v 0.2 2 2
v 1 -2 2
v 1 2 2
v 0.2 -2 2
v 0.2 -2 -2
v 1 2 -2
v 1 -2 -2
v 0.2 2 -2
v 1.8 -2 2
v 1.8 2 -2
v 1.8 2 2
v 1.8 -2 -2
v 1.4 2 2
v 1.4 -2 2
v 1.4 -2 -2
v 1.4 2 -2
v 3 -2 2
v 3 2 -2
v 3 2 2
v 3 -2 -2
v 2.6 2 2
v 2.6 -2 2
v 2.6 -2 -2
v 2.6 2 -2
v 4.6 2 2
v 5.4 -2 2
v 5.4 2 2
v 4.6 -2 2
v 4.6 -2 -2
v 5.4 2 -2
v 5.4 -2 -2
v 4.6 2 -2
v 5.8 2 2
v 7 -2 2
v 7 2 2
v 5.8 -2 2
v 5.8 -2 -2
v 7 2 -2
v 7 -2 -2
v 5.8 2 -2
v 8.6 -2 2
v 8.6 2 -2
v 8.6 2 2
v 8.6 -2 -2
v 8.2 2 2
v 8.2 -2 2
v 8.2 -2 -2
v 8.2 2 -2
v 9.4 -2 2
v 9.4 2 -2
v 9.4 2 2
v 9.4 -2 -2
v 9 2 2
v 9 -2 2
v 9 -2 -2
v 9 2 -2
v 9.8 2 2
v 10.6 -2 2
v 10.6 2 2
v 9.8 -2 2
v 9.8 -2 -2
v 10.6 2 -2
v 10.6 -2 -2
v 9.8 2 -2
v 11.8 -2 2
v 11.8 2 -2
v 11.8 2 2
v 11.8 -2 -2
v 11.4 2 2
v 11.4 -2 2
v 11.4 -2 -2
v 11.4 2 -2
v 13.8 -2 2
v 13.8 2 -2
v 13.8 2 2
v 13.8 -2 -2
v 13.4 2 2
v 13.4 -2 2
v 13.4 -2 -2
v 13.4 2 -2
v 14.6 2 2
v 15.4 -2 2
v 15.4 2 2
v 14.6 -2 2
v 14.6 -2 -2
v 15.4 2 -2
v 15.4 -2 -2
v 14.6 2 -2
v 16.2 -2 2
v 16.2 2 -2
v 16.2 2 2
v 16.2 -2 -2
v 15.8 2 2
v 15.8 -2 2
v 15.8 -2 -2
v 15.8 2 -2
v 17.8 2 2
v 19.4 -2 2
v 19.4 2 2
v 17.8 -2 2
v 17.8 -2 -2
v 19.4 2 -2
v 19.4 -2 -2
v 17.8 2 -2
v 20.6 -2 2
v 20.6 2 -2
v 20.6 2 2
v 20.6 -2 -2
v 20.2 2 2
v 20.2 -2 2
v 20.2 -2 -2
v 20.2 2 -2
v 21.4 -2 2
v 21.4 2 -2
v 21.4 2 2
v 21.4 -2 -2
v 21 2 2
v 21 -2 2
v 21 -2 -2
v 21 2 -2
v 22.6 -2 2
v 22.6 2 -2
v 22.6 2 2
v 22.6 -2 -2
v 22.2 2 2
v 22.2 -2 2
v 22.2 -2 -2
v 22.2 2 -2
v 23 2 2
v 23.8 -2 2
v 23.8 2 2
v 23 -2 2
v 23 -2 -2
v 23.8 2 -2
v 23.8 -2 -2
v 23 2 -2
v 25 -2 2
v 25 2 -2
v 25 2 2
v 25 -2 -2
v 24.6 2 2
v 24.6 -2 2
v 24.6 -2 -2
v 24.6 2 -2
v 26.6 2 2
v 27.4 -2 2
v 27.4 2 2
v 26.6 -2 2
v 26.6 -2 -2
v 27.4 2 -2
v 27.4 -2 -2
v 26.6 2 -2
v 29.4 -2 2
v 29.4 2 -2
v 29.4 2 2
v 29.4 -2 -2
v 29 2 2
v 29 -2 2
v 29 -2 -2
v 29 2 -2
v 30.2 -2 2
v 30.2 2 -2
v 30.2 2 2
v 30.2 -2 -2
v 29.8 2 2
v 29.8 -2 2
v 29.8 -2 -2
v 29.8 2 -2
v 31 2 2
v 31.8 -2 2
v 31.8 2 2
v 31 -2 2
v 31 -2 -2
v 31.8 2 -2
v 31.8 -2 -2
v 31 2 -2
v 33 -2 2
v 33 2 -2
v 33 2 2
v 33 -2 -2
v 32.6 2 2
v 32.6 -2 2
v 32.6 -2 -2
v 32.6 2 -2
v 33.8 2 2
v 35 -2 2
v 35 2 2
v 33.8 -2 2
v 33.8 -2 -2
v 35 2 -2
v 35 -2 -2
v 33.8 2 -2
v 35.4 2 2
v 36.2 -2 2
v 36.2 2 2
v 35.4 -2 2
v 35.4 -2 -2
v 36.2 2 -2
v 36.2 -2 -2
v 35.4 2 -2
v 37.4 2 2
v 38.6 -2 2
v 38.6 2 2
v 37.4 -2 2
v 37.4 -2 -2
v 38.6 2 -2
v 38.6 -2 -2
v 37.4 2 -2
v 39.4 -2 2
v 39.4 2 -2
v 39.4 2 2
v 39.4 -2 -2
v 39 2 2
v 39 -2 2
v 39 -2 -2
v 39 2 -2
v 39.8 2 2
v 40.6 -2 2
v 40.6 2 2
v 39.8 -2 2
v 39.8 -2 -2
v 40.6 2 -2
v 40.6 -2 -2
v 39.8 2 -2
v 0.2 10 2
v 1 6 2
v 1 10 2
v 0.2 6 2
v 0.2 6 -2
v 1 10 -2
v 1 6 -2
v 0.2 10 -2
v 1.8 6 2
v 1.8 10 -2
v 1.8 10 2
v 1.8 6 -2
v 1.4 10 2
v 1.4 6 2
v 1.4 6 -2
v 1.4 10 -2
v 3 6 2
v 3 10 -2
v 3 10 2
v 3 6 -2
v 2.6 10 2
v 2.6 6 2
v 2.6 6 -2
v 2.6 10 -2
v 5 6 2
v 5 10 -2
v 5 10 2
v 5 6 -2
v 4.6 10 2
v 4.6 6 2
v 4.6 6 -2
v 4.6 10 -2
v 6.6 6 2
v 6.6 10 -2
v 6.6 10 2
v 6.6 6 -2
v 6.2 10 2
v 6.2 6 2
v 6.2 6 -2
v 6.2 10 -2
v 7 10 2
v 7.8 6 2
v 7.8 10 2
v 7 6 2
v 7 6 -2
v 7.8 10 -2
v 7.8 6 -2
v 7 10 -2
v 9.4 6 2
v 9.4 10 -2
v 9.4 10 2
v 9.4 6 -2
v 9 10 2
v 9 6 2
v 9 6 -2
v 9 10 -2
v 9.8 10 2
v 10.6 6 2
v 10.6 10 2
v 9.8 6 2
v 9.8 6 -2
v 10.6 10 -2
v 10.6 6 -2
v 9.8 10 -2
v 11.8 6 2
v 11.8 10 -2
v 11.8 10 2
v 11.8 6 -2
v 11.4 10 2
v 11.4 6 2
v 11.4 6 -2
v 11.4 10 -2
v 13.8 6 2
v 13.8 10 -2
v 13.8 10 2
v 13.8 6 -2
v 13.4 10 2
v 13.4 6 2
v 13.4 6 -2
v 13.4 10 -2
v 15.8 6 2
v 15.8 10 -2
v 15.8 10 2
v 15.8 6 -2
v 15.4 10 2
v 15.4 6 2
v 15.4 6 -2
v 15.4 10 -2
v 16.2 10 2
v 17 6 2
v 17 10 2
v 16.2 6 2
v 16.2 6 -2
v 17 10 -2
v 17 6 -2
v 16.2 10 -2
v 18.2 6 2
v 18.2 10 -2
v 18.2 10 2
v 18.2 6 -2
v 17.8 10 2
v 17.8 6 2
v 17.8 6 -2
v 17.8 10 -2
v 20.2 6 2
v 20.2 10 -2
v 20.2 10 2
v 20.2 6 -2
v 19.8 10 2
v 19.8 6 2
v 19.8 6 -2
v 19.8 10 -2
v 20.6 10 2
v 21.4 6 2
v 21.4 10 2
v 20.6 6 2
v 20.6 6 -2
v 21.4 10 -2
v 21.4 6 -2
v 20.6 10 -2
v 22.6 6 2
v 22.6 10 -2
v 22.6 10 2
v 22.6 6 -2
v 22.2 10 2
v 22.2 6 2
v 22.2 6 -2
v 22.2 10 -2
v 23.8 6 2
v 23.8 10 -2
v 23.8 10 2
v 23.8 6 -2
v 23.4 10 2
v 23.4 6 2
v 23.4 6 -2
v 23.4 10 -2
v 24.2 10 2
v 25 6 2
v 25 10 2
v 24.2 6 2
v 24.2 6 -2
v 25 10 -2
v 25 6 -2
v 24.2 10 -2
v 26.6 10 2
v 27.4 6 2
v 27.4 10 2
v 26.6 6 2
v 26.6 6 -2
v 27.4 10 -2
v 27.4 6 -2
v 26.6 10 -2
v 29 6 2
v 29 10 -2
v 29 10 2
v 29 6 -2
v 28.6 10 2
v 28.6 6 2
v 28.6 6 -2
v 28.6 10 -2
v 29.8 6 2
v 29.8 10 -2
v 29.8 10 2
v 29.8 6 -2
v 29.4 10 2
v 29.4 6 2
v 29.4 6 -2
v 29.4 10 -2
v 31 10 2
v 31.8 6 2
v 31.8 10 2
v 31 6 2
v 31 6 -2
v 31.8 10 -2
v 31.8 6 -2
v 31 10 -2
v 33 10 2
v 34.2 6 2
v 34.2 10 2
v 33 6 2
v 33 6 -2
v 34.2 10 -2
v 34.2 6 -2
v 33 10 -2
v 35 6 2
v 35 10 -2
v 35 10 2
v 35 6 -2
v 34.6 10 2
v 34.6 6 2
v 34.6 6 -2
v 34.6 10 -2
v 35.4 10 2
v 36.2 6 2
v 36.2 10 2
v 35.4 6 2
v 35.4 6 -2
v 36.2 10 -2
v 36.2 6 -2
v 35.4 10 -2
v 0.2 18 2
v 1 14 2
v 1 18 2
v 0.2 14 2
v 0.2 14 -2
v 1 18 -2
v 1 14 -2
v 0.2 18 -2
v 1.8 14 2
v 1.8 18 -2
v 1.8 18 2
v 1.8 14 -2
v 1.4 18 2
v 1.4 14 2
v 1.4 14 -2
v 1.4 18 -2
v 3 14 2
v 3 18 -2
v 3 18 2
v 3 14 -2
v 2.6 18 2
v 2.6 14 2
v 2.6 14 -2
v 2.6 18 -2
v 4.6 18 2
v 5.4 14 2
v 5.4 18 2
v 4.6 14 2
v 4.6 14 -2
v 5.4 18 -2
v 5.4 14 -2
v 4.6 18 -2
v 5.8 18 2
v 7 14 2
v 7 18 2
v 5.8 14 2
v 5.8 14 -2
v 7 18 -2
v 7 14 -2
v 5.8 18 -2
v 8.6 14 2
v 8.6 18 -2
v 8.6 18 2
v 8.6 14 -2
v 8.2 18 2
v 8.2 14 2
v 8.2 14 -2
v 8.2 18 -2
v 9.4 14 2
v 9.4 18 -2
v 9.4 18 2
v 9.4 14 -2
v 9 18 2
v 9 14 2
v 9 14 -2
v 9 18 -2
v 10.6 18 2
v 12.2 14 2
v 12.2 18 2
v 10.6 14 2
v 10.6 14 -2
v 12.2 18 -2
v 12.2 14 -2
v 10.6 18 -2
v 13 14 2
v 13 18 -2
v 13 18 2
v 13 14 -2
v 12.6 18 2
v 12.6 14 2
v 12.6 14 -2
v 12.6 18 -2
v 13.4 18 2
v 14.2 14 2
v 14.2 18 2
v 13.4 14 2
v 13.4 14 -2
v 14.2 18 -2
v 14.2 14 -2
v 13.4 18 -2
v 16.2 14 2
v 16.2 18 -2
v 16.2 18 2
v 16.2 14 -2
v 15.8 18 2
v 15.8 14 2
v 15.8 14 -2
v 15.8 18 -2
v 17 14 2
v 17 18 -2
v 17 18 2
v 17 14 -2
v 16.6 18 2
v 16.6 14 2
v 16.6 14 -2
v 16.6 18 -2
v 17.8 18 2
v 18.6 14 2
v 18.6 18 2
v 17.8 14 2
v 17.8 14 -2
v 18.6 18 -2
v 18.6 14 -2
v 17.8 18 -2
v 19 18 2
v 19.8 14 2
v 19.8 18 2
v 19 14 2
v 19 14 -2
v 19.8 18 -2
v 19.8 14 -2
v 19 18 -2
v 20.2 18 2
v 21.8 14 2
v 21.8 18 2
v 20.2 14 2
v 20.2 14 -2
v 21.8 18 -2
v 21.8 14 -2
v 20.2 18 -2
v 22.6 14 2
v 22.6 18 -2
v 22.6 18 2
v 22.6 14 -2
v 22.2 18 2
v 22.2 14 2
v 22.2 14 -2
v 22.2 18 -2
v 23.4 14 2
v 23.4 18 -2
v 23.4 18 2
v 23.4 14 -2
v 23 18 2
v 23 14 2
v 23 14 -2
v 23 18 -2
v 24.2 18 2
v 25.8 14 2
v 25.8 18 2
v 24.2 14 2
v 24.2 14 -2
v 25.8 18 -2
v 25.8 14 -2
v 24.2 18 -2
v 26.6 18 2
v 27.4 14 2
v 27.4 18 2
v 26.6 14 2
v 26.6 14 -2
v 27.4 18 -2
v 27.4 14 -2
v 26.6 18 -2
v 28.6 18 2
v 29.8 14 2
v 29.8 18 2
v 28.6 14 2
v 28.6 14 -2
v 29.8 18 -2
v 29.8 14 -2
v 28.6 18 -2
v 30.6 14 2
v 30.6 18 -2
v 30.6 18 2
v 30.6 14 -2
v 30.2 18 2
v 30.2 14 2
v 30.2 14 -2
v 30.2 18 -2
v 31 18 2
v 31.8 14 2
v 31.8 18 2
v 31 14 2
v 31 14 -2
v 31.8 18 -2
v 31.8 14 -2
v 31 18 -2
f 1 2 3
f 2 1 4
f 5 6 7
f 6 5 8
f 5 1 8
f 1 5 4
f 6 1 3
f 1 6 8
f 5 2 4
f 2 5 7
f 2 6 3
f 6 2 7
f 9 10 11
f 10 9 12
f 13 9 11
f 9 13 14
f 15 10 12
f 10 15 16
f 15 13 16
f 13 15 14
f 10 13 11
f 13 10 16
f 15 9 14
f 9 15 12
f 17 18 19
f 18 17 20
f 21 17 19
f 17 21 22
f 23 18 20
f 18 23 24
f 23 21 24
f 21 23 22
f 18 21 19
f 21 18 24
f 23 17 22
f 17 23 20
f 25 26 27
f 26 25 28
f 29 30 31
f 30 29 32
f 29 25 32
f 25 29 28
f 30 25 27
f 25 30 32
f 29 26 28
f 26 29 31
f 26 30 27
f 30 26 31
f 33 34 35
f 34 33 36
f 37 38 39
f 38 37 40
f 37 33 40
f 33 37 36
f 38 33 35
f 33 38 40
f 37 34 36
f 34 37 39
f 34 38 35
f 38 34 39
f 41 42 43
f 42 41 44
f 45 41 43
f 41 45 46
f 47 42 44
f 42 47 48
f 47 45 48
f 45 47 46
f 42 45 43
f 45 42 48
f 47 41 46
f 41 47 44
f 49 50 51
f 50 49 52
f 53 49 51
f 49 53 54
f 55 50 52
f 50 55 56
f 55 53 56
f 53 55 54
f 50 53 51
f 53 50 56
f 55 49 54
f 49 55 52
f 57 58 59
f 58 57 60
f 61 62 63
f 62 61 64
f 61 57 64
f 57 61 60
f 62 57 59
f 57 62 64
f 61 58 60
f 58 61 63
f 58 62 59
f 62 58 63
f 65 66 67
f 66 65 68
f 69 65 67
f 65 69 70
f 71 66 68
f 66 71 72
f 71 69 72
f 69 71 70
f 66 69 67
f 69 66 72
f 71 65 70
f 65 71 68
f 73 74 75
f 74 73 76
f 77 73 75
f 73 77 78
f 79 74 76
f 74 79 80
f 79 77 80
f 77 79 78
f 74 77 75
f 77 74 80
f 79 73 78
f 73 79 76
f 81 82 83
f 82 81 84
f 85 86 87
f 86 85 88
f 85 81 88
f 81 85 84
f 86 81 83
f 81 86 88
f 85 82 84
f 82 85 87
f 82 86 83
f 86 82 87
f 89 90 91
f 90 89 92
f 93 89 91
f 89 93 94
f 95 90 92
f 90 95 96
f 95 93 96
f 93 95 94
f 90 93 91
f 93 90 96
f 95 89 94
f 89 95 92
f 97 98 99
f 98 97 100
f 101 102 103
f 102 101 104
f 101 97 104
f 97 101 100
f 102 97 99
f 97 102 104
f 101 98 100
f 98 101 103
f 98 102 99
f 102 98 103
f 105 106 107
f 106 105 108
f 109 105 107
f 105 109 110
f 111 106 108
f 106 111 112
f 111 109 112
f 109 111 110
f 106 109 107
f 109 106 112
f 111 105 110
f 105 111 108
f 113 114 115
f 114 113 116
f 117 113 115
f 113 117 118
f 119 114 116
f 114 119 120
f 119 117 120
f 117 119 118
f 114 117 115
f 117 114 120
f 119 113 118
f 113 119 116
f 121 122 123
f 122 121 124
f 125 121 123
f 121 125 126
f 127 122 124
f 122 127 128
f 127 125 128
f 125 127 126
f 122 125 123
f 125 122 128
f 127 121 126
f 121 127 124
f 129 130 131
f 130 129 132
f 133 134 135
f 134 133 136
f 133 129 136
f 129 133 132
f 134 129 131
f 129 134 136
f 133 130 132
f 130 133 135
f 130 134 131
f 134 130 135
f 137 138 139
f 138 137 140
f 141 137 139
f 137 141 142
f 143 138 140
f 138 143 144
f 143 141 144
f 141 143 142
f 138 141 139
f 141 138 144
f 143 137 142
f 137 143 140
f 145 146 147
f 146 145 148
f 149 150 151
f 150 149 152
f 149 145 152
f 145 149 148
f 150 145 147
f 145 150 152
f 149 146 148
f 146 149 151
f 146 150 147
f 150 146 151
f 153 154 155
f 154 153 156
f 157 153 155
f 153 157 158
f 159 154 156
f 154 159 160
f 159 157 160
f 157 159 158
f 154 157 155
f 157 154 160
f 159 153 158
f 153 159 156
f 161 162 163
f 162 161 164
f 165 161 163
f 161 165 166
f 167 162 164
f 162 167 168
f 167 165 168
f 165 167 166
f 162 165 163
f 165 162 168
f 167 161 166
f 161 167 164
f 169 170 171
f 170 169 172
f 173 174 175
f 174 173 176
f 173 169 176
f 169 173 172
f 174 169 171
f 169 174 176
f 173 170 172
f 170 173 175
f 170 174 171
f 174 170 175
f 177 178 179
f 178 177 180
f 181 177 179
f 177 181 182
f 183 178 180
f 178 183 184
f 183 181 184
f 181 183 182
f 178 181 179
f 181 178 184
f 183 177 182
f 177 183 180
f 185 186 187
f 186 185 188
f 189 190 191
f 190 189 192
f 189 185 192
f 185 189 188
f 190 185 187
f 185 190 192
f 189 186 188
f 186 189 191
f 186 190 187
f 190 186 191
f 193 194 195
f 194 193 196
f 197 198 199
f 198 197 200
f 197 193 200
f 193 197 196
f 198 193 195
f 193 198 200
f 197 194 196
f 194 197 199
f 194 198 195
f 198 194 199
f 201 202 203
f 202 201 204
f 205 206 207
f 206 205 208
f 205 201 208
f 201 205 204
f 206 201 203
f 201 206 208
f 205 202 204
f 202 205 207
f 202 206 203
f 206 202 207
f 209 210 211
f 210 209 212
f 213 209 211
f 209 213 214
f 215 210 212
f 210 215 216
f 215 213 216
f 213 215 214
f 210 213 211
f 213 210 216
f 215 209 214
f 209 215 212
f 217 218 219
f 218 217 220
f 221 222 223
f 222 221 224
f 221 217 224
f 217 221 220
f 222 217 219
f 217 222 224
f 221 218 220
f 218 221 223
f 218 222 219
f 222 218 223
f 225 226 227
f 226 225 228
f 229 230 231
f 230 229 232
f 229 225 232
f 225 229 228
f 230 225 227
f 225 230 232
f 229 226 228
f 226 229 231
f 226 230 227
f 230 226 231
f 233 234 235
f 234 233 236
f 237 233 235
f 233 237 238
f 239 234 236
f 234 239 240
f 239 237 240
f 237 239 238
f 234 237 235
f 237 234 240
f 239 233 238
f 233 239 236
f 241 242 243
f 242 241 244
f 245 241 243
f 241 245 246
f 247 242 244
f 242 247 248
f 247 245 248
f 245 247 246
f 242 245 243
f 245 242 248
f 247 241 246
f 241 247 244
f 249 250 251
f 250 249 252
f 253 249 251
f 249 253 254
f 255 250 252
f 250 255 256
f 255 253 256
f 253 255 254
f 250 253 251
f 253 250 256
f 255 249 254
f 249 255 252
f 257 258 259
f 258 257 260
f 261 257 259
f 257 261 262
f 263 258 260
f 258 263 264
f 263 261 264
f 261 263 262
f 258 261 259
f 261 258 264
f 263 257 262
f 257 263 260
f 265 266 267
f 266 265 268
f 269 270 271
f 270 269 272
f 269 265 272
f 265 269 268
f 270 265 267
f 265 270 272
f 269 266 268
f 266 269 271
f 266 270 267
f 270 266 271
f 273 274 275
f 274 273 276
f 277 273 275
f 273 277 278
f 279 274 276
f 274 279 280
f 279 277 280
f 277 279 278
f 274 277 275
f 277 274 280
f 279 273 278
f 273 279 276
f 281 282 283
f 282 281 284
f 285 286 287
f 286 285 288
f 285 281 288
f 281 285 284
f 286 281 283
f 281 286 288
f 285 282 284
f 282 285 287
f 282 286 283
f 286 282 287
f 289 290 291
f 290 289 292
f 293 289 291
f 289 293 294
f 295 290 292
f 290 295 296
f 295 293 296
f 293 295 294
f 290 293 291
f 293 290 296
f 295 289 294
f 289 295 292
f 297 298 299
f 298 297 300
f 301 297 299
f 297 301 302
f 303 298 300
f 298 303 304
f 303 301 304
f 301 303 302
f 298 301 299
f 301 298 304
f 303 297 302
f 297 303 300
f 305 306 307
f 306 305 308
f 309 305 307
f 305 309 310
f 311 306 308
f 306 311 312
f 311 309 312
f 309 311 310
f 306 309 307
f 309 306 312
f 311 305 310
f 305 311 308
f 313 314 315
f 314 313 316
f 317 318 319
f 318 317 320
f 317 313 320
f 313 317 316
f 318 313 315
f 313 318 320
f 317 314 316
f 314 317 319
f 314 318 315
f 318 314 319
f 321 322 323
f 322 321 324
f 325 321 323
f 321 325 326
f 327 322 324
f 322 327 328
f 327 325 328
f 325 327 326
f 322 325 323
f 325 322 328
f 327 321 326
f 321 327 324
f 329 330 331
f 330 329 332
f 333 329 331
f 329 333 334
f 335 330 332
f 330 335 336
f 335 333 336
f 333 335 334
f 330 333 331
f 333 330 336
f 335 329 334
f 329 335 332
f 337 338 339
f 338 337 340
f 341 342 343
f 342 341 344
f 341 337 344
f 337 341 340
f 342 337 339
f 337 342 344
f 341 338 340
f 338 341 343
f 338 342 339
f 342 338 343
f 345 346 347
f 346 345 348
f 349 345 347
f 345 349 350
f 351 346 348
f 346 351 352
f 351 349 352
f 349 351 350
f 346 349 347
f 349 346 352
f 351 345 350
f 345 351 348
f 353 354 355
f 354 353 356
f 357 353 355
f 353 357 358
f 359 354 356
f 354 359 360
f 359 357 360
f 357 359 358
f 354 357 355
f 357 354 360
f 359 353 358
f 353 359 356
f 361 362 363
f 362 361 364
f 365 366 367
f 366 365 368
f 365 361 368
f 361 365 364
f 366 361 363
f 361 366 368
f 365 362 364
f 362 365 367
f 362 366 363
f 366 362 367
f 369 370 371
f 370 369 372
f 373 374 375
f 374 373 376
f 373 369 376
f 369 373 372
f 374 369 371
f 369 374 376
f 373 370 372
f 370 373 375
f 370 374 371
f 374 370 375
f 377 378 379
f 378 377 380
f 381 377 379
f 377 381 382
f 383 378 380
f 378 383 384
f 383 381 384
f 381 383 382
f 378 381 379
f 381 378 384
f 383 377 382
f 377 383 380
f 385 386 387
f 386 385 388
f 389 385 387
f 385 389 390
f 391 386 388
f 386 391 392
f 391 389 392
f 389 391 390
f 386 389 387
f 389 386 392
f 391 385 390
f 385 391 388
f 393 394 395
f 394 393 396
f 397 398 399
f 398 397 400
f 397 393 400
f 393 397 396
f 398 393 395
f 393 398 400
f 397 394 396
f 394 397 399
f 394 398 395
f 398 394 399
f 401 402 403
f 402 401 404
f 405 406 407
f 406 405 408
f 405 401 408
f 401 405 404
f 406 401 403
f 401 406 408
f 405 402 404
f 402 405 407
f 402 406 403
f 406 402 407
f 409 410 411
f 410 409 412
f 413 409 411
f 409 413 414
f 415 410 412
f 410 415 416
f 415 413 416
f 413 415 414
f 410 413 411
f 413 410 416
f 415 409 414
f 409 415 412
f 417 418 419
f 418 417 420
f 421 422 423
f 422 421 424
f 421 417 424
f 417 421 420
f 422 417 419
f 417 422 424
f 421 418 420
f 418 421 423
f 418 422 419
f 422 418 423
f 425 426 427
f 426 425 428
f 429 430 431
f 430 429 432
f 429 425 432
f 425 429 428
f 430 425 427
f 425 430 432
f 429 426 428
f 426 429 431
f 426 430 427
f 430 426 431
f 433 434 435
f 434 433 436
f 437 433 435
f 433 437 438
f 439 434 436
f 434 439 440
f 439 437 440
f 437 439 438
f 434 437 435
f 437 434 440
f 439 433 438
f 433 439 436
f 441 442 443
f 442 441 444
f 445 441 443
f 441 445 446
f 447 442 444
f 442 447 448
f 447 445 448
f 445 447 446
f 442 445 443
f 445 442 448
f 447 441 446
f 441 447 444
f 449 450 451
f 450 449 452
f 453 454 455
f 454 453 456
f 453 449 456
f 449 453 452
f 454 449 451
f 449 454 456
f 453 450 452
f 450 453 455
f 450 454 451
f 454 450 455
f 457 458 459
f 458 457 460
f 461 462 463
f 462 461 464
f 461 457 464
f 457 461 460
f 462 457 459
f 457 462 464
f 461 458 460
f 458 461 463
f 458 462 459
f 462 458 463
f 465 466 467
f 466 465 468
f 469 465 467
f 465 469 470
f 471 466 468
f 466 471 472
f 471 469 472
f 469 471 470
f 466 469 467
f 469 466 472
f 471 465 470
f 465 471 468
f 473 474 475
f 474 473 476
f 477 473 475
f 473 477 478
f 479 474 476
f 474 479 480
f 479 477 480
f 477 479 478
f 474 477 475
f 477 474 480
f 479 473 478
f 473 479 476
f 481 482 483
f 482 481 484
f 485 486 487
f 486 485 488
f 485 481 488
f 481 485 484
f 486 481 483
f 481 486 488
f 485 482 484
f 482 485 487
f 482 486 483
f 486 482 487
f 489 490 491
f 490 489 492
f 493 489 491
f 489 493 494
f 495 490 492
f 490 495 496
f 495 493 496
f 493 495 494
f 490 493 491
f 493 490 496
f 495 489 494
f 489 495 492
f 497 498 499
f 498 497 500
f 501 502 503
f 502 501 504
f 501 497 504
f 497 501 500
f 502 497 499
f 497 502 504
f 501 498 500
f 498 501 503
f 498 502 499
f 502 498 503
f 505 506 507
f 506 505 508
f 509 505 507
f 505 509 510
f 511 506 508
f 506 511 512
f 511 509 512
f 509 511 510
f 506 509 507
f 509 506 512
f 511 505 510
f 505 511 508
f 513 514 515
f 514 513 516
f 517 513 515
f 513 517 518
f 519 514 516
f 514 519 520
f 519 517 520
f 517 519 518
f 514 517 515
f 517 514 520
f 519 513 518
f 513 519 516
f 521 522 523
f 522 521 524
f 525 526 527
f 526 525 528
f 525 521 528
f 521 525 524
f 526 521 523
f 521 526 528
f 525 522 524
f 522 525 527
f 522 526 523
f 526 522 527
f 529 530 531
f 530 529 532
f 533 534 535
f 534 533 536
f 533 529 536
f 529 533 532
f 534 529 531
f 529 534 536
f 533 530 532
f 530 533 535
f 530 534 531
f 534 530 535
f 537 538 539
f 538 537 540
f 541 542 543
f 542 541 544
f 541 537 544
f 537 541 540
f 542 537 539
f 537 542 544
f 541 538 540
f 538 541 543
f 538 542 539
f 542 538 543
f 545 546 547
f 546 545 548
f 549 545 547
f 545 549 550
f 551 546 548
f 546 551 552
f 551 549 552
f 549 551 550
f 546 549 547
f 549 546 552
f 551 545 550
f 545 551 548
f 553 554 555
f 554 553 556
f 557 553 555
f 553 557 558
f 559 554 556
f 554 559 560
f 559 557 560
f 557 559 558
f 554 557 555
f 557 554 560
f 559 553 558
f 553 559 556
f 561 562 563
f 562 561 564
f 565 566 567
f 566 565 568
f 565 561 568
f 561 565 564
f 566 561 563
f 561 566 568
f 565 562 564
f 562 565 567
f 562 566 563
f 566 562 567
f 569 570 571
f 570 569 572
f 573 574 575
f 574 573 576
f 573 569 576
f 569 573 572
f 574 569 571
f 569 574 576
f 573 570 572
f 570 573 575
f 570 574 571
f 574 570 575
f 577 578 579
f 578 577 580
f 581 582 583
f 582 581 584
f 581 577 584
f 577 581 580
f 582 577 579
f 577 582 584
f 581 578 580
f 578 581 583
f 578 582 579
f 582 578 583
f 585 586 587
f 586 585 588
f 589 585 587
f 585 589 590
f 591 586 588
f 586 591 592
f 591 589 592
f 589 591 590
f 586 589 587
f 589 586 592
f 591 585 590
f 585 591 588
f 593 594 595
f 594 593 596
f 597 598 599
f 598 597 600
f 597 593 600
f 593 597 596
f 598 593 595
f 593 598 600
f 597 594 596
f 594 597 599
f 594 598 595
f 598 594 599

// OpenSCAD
translate([0.4,0,0])  cube(size = [0.4,4,4], center=true);
translate([0.8,0,0])  cube(size = [0.4,4,4], center=true);
translate([1.6,0,0])  cube(size = [0.4,4,4], center=true);
translate([2.8,0,0])  cube(size = [0.4,4,4], center=true);
translate([4.8,0,0])  cube(size = [0.4,4,4], center=true);
translate([5.2,0,0])  cube(size = [0.4,4,4], center=true);
translate([6,0,0])  cube(size = [0.4,4,4], center=true);
translate([6.4,0,0])  cube(size = [0.4,4,4], center=true);
translate([6.8,0,0])  cube(size = [0.4,4,4], center=true);
translate([8.4,0,0])  cube(size = [0.4,4,4], center=true);
translate([9.2,0,0])  cube(size = [0.4,4,4], center=true);
translate([10,0,0])  cube(size = [0.4,4,4], center=true);
translate([10.4,0,0])  cube(size = [0.4,4,4], center=true);
translate([11.6,0,0])  cube(size = [0.4,4,4], center=true);
translate([13.6,0,0])  cube(size = [0.4,4,4], center=true);
translate([14.8,0,0])  cube(size = [0.4,4,4], center=true);
translate([15.2,0,0])  cube(size = [0.4,4,4], center=true);
translate([16,0,0])  cube(size = [0.4,4,4], center=true);
translate([18,0,0])  cube(size = [0.4,4,4], center=true);
translate([18.4,0,0])  cube(size = [0.4,4,4], center=true);
translate([18.8,0,0])  cube(size = [0.4,4,4], center=true);
translate([19.2,0,0])  cube(size = [0.4,4,4], center=true);
translate([20.4,0,0])  cube(size = [0.4,4,4], center=true);
translate([21.2,0,0])  cube(size = [0.4,4,4], center=true);
translate([22.4,0,0])  cube(size = [0.4,4,4], center=true);
translate([23.2,0,0])  cube(size = [0.4,4,4], center=true);
translate([23.6,0,0])  cube(size = [0.4,4,4], center=true);
translate([24.8,0,0])  cube(size = [0.4,4,4], center=true);
translate([26.8,0,0])  cube(size = [0.4,4,4], center=true);
translate([27.2,0,0])  cube(size = [0.4,4,4], center=true);
translate([29.2,0,0])  cube(size = [0.4,4,4], center=true);
translate([30,0,0])  cube(size = [0.4,4,4], center=true);
translate([31.2,0,0])  cube(size = [0.4,4,4], center=true);
translate([31.6,0,0])  cube(size = [0.4,4,4], center=true);
translate([32.8,0,0])  cube(size = [0.4,4,4], center=true);
translate([34,0,0])  cube(size = [0.4,4,4], center=true);
translate([34.4,0,0])  cube(size = [0.4,4,4], center=true);
translate([34.8,0,0])  cube(size = [0.4,4,4], center=true);
translate([35.6,0,0])  cube(size = [0.4,4,4], center=true);
translate([36,0,0])  cube(size = [0.4,4,4], center=true);
translate([37.6,0,0])  cube(size = [0.4,4,4], center=true);
translate([38,0,0])  cube(size = [0.4,4,4], center=true);
translate([38.4,0,0])  cube(size = [0.4,4,4], center=true);
translate([39.2,0,0])  cube(size = [0.4,4,4], center=true);
translate([40,0,0])  cube(size = [0.4,4,4], center=true);
translate([40.4,0,0])  cube(size = [0.4,4,4], center=true);
translate([0.4,8,0])  cube(size = [0.4,4,4], center=true);
translate([0.8,8,0])  cube(size = [0.4,4,4], center=true);
translate([1.6,8,0])  cube(size = [0.4,4,4], center=true);
translate([2.8,8,0])  cube(size = [0.4,4,4], center=true);
translate([4.8,8,0])  cube(size = [0.4,4,4], center=true);
translate([6.4,8,0])  cube(size = [0.4,4,4], center=true);
translate([7.2,8,0])  cube(size = [0.4,4,4], center=true);
translate([7.6,8,0])  cube(size = [0.4,4,4], center=true);
translate([9.2,8,0])  cube(size = [0.4,4,4], center=true);
translate([10,8,0])  cube(size = [0.4,4,4], center=true);
translate([10.4,8,0])  cube(size = [0.4,4,4], center=true);
translate([11.6,8,0])  cube(size = [0.4,4,4], center=true);
translate([13.6,8,0])  cube(size = [0.4,4,4], center=true);
translate([15.6,8,0])  cube(size = [0.4,4,4], center=true);
translate([16.4,8,0])  cube(size = [0.4,4,4], center=true);
translate([16.8,8,0])  cube(size = [0.4,4,4], center=true);
translate([18,8,0])  cube(size = [0.4,4,4], center=true);
translate([20,8,0])  cube(size = [0.4,4,4], center=true);
translate([20.8,8,0])  cube(size = [0.4,4,4], center=true);
translate([21.2,8,0])  cube(size = [0.4,4,4], center=true);
translate([22.4,8,0])  cube(size = [0.4,4,4], center=true);
translate([23.6,8,0])  cube(size = [0.4,4,4], center=true);
translate([24.4,8,0])  cube(size = [0.4,4,4], center=true);
translate([24.8,8,0])  cube(size = [0.4,4,4], center=true);
translate([26.8,8,0])  cube(size = [0.4,4,4], center=true);
translate([27.2,8,0])  cube(size = [0.4,4,4], center=true);
translate([28.8,8,0])  cube(size = [0.4,4,4], center=true);
translate([29.6,8,0])  cube(size = [0.4,4,4], center=true);
translate([31.2,8,0])  cube(size = [0.4,4,4], center=true);
translate([31.6,8,0])  cube(size = [0.4,4,4], center=true);
translate([33.2,8,0])  cube(size = [0.4,4,4], center=true);
translate([33.6,8,0])  cube(size = [0.4,4,4], center=true);
translate([34,8,0])  cube(size = [0.4,4,4], center=true);
translate([34.8,8,0])  cube(size = [0.4,4,4], center=true);
translate([35.6,8,0])  cube(size = [0.4,4,4], center=true);
translate([36,8,0])  cube(size = [0.4,4,4], center=true);
translate([0.4,16,0])  cube(size = [0.4,4,4], center=true);
translate([0.8,16,0])  cube(size = [0.4,4,4], center=true);
translate([1.6,16,0])  cube(size = [0.4,4,4], center=true);
translate([2.8,16,0])  cube(size = [0.4,4,4], center=true);
translate([4.8,16,0])  cube(size = [0.4,4,4], center=true);
translate([5.2,16,0])  cube(size = [0.4,4,4], center=true);
translate([6,16,0])  cube(size = [0.4,4,4], center=true);
translate([6.4,16,0])  cube(size = [0.4,4,4], center=true);
translate([6.8,16,0])  cube(size = [0.4,4,4], center=true);
translate([8.4,16,0])  cube(size = [0.4,4,4], center=true);
translate([9.2,16,0])  cube(size = [0.4,4,4], center=true);
translate([10.8,16,0])  cube(size = [0.4,4,4], center=true);
translate([11.2,16,0])  cube(size = [0.4,4,4], center=true);
translate([11.6,16,0])  cube(size = [0.4,4,4], center=true);
translate([12,16,0])  cube(size = [0.4,4,4], center=true);
translate([12.8,16,0])  cube(size = [0.4,4,4], center=true);
translate([13.6,16,0])  cube(size = [0.4,4,4], center=true);
translate([14,16,0])  cube(size = [0.4,4,4], center=true);
translate([16,16,0])  cube(size = [0.4,4,4], center=true);
translate([16.8,16,0])  cube(size = [0.4,4,4], center=true);
translate([18,16,0])  cube(size = [0.4,4,4], center=true);
translate([18.4,16,0])  cube(size = [0.4,4,4], center=true);
translate([19.2,16,0])  cube(size = [0.4,4,4], center=true);
translate([19.6,16,0])  cube(size = [0.4,4,4], center=true);
translate([20.4,16,0])  cube(size = [0.4,4,4], center=true);
translate([20.8,16,0])  cube(size = [0.4,4,4], center=true);
translate([21.2,16,0])  cube(size = [0.4,4,4], center=true);
translate([21.6,16,0])  cube(size = [0.4,4,4], center=true);
translate([22.4,16,0])  cube(size = [0.4,4,4], center=true);
translate([23.2,16,0])  cube(size = [0.4,4,4], center=true);
translate([24.4,16,0])  cube(size = [0.4,4,4], center=true);
translate([24.8,16,0])  cube(size = [0.4,4,4], center=true);
translate([25.2,16,0])  cube(size = [0.4,4,4], center=true);
translate([25.6,16,0])  cube(size = [0.4,4,4], center=true);
translate([26.8,16,0])  cube(size = [0.4,4,4], center=true);
translate([27.2,16,0])  cube(size = [0.4,4,4], center=true);
translate([28.8,16,0])  cube(size = [0.4,4,4], center=true);
translate([29.2,16,0])  cube(size = [0.4,4,4], center=true);
translate([29.6,16,0])  cube(size = [0.4,4,4], center=true);
translate([30.4,16,0])  cube(size = [0.4,4,4], center=true);
translate([31.2,16,0])  cube(size = [0.4,4,4], center=true);
translate([31.6,16,0])  cube(size = [0.4,4,4], center=true);
